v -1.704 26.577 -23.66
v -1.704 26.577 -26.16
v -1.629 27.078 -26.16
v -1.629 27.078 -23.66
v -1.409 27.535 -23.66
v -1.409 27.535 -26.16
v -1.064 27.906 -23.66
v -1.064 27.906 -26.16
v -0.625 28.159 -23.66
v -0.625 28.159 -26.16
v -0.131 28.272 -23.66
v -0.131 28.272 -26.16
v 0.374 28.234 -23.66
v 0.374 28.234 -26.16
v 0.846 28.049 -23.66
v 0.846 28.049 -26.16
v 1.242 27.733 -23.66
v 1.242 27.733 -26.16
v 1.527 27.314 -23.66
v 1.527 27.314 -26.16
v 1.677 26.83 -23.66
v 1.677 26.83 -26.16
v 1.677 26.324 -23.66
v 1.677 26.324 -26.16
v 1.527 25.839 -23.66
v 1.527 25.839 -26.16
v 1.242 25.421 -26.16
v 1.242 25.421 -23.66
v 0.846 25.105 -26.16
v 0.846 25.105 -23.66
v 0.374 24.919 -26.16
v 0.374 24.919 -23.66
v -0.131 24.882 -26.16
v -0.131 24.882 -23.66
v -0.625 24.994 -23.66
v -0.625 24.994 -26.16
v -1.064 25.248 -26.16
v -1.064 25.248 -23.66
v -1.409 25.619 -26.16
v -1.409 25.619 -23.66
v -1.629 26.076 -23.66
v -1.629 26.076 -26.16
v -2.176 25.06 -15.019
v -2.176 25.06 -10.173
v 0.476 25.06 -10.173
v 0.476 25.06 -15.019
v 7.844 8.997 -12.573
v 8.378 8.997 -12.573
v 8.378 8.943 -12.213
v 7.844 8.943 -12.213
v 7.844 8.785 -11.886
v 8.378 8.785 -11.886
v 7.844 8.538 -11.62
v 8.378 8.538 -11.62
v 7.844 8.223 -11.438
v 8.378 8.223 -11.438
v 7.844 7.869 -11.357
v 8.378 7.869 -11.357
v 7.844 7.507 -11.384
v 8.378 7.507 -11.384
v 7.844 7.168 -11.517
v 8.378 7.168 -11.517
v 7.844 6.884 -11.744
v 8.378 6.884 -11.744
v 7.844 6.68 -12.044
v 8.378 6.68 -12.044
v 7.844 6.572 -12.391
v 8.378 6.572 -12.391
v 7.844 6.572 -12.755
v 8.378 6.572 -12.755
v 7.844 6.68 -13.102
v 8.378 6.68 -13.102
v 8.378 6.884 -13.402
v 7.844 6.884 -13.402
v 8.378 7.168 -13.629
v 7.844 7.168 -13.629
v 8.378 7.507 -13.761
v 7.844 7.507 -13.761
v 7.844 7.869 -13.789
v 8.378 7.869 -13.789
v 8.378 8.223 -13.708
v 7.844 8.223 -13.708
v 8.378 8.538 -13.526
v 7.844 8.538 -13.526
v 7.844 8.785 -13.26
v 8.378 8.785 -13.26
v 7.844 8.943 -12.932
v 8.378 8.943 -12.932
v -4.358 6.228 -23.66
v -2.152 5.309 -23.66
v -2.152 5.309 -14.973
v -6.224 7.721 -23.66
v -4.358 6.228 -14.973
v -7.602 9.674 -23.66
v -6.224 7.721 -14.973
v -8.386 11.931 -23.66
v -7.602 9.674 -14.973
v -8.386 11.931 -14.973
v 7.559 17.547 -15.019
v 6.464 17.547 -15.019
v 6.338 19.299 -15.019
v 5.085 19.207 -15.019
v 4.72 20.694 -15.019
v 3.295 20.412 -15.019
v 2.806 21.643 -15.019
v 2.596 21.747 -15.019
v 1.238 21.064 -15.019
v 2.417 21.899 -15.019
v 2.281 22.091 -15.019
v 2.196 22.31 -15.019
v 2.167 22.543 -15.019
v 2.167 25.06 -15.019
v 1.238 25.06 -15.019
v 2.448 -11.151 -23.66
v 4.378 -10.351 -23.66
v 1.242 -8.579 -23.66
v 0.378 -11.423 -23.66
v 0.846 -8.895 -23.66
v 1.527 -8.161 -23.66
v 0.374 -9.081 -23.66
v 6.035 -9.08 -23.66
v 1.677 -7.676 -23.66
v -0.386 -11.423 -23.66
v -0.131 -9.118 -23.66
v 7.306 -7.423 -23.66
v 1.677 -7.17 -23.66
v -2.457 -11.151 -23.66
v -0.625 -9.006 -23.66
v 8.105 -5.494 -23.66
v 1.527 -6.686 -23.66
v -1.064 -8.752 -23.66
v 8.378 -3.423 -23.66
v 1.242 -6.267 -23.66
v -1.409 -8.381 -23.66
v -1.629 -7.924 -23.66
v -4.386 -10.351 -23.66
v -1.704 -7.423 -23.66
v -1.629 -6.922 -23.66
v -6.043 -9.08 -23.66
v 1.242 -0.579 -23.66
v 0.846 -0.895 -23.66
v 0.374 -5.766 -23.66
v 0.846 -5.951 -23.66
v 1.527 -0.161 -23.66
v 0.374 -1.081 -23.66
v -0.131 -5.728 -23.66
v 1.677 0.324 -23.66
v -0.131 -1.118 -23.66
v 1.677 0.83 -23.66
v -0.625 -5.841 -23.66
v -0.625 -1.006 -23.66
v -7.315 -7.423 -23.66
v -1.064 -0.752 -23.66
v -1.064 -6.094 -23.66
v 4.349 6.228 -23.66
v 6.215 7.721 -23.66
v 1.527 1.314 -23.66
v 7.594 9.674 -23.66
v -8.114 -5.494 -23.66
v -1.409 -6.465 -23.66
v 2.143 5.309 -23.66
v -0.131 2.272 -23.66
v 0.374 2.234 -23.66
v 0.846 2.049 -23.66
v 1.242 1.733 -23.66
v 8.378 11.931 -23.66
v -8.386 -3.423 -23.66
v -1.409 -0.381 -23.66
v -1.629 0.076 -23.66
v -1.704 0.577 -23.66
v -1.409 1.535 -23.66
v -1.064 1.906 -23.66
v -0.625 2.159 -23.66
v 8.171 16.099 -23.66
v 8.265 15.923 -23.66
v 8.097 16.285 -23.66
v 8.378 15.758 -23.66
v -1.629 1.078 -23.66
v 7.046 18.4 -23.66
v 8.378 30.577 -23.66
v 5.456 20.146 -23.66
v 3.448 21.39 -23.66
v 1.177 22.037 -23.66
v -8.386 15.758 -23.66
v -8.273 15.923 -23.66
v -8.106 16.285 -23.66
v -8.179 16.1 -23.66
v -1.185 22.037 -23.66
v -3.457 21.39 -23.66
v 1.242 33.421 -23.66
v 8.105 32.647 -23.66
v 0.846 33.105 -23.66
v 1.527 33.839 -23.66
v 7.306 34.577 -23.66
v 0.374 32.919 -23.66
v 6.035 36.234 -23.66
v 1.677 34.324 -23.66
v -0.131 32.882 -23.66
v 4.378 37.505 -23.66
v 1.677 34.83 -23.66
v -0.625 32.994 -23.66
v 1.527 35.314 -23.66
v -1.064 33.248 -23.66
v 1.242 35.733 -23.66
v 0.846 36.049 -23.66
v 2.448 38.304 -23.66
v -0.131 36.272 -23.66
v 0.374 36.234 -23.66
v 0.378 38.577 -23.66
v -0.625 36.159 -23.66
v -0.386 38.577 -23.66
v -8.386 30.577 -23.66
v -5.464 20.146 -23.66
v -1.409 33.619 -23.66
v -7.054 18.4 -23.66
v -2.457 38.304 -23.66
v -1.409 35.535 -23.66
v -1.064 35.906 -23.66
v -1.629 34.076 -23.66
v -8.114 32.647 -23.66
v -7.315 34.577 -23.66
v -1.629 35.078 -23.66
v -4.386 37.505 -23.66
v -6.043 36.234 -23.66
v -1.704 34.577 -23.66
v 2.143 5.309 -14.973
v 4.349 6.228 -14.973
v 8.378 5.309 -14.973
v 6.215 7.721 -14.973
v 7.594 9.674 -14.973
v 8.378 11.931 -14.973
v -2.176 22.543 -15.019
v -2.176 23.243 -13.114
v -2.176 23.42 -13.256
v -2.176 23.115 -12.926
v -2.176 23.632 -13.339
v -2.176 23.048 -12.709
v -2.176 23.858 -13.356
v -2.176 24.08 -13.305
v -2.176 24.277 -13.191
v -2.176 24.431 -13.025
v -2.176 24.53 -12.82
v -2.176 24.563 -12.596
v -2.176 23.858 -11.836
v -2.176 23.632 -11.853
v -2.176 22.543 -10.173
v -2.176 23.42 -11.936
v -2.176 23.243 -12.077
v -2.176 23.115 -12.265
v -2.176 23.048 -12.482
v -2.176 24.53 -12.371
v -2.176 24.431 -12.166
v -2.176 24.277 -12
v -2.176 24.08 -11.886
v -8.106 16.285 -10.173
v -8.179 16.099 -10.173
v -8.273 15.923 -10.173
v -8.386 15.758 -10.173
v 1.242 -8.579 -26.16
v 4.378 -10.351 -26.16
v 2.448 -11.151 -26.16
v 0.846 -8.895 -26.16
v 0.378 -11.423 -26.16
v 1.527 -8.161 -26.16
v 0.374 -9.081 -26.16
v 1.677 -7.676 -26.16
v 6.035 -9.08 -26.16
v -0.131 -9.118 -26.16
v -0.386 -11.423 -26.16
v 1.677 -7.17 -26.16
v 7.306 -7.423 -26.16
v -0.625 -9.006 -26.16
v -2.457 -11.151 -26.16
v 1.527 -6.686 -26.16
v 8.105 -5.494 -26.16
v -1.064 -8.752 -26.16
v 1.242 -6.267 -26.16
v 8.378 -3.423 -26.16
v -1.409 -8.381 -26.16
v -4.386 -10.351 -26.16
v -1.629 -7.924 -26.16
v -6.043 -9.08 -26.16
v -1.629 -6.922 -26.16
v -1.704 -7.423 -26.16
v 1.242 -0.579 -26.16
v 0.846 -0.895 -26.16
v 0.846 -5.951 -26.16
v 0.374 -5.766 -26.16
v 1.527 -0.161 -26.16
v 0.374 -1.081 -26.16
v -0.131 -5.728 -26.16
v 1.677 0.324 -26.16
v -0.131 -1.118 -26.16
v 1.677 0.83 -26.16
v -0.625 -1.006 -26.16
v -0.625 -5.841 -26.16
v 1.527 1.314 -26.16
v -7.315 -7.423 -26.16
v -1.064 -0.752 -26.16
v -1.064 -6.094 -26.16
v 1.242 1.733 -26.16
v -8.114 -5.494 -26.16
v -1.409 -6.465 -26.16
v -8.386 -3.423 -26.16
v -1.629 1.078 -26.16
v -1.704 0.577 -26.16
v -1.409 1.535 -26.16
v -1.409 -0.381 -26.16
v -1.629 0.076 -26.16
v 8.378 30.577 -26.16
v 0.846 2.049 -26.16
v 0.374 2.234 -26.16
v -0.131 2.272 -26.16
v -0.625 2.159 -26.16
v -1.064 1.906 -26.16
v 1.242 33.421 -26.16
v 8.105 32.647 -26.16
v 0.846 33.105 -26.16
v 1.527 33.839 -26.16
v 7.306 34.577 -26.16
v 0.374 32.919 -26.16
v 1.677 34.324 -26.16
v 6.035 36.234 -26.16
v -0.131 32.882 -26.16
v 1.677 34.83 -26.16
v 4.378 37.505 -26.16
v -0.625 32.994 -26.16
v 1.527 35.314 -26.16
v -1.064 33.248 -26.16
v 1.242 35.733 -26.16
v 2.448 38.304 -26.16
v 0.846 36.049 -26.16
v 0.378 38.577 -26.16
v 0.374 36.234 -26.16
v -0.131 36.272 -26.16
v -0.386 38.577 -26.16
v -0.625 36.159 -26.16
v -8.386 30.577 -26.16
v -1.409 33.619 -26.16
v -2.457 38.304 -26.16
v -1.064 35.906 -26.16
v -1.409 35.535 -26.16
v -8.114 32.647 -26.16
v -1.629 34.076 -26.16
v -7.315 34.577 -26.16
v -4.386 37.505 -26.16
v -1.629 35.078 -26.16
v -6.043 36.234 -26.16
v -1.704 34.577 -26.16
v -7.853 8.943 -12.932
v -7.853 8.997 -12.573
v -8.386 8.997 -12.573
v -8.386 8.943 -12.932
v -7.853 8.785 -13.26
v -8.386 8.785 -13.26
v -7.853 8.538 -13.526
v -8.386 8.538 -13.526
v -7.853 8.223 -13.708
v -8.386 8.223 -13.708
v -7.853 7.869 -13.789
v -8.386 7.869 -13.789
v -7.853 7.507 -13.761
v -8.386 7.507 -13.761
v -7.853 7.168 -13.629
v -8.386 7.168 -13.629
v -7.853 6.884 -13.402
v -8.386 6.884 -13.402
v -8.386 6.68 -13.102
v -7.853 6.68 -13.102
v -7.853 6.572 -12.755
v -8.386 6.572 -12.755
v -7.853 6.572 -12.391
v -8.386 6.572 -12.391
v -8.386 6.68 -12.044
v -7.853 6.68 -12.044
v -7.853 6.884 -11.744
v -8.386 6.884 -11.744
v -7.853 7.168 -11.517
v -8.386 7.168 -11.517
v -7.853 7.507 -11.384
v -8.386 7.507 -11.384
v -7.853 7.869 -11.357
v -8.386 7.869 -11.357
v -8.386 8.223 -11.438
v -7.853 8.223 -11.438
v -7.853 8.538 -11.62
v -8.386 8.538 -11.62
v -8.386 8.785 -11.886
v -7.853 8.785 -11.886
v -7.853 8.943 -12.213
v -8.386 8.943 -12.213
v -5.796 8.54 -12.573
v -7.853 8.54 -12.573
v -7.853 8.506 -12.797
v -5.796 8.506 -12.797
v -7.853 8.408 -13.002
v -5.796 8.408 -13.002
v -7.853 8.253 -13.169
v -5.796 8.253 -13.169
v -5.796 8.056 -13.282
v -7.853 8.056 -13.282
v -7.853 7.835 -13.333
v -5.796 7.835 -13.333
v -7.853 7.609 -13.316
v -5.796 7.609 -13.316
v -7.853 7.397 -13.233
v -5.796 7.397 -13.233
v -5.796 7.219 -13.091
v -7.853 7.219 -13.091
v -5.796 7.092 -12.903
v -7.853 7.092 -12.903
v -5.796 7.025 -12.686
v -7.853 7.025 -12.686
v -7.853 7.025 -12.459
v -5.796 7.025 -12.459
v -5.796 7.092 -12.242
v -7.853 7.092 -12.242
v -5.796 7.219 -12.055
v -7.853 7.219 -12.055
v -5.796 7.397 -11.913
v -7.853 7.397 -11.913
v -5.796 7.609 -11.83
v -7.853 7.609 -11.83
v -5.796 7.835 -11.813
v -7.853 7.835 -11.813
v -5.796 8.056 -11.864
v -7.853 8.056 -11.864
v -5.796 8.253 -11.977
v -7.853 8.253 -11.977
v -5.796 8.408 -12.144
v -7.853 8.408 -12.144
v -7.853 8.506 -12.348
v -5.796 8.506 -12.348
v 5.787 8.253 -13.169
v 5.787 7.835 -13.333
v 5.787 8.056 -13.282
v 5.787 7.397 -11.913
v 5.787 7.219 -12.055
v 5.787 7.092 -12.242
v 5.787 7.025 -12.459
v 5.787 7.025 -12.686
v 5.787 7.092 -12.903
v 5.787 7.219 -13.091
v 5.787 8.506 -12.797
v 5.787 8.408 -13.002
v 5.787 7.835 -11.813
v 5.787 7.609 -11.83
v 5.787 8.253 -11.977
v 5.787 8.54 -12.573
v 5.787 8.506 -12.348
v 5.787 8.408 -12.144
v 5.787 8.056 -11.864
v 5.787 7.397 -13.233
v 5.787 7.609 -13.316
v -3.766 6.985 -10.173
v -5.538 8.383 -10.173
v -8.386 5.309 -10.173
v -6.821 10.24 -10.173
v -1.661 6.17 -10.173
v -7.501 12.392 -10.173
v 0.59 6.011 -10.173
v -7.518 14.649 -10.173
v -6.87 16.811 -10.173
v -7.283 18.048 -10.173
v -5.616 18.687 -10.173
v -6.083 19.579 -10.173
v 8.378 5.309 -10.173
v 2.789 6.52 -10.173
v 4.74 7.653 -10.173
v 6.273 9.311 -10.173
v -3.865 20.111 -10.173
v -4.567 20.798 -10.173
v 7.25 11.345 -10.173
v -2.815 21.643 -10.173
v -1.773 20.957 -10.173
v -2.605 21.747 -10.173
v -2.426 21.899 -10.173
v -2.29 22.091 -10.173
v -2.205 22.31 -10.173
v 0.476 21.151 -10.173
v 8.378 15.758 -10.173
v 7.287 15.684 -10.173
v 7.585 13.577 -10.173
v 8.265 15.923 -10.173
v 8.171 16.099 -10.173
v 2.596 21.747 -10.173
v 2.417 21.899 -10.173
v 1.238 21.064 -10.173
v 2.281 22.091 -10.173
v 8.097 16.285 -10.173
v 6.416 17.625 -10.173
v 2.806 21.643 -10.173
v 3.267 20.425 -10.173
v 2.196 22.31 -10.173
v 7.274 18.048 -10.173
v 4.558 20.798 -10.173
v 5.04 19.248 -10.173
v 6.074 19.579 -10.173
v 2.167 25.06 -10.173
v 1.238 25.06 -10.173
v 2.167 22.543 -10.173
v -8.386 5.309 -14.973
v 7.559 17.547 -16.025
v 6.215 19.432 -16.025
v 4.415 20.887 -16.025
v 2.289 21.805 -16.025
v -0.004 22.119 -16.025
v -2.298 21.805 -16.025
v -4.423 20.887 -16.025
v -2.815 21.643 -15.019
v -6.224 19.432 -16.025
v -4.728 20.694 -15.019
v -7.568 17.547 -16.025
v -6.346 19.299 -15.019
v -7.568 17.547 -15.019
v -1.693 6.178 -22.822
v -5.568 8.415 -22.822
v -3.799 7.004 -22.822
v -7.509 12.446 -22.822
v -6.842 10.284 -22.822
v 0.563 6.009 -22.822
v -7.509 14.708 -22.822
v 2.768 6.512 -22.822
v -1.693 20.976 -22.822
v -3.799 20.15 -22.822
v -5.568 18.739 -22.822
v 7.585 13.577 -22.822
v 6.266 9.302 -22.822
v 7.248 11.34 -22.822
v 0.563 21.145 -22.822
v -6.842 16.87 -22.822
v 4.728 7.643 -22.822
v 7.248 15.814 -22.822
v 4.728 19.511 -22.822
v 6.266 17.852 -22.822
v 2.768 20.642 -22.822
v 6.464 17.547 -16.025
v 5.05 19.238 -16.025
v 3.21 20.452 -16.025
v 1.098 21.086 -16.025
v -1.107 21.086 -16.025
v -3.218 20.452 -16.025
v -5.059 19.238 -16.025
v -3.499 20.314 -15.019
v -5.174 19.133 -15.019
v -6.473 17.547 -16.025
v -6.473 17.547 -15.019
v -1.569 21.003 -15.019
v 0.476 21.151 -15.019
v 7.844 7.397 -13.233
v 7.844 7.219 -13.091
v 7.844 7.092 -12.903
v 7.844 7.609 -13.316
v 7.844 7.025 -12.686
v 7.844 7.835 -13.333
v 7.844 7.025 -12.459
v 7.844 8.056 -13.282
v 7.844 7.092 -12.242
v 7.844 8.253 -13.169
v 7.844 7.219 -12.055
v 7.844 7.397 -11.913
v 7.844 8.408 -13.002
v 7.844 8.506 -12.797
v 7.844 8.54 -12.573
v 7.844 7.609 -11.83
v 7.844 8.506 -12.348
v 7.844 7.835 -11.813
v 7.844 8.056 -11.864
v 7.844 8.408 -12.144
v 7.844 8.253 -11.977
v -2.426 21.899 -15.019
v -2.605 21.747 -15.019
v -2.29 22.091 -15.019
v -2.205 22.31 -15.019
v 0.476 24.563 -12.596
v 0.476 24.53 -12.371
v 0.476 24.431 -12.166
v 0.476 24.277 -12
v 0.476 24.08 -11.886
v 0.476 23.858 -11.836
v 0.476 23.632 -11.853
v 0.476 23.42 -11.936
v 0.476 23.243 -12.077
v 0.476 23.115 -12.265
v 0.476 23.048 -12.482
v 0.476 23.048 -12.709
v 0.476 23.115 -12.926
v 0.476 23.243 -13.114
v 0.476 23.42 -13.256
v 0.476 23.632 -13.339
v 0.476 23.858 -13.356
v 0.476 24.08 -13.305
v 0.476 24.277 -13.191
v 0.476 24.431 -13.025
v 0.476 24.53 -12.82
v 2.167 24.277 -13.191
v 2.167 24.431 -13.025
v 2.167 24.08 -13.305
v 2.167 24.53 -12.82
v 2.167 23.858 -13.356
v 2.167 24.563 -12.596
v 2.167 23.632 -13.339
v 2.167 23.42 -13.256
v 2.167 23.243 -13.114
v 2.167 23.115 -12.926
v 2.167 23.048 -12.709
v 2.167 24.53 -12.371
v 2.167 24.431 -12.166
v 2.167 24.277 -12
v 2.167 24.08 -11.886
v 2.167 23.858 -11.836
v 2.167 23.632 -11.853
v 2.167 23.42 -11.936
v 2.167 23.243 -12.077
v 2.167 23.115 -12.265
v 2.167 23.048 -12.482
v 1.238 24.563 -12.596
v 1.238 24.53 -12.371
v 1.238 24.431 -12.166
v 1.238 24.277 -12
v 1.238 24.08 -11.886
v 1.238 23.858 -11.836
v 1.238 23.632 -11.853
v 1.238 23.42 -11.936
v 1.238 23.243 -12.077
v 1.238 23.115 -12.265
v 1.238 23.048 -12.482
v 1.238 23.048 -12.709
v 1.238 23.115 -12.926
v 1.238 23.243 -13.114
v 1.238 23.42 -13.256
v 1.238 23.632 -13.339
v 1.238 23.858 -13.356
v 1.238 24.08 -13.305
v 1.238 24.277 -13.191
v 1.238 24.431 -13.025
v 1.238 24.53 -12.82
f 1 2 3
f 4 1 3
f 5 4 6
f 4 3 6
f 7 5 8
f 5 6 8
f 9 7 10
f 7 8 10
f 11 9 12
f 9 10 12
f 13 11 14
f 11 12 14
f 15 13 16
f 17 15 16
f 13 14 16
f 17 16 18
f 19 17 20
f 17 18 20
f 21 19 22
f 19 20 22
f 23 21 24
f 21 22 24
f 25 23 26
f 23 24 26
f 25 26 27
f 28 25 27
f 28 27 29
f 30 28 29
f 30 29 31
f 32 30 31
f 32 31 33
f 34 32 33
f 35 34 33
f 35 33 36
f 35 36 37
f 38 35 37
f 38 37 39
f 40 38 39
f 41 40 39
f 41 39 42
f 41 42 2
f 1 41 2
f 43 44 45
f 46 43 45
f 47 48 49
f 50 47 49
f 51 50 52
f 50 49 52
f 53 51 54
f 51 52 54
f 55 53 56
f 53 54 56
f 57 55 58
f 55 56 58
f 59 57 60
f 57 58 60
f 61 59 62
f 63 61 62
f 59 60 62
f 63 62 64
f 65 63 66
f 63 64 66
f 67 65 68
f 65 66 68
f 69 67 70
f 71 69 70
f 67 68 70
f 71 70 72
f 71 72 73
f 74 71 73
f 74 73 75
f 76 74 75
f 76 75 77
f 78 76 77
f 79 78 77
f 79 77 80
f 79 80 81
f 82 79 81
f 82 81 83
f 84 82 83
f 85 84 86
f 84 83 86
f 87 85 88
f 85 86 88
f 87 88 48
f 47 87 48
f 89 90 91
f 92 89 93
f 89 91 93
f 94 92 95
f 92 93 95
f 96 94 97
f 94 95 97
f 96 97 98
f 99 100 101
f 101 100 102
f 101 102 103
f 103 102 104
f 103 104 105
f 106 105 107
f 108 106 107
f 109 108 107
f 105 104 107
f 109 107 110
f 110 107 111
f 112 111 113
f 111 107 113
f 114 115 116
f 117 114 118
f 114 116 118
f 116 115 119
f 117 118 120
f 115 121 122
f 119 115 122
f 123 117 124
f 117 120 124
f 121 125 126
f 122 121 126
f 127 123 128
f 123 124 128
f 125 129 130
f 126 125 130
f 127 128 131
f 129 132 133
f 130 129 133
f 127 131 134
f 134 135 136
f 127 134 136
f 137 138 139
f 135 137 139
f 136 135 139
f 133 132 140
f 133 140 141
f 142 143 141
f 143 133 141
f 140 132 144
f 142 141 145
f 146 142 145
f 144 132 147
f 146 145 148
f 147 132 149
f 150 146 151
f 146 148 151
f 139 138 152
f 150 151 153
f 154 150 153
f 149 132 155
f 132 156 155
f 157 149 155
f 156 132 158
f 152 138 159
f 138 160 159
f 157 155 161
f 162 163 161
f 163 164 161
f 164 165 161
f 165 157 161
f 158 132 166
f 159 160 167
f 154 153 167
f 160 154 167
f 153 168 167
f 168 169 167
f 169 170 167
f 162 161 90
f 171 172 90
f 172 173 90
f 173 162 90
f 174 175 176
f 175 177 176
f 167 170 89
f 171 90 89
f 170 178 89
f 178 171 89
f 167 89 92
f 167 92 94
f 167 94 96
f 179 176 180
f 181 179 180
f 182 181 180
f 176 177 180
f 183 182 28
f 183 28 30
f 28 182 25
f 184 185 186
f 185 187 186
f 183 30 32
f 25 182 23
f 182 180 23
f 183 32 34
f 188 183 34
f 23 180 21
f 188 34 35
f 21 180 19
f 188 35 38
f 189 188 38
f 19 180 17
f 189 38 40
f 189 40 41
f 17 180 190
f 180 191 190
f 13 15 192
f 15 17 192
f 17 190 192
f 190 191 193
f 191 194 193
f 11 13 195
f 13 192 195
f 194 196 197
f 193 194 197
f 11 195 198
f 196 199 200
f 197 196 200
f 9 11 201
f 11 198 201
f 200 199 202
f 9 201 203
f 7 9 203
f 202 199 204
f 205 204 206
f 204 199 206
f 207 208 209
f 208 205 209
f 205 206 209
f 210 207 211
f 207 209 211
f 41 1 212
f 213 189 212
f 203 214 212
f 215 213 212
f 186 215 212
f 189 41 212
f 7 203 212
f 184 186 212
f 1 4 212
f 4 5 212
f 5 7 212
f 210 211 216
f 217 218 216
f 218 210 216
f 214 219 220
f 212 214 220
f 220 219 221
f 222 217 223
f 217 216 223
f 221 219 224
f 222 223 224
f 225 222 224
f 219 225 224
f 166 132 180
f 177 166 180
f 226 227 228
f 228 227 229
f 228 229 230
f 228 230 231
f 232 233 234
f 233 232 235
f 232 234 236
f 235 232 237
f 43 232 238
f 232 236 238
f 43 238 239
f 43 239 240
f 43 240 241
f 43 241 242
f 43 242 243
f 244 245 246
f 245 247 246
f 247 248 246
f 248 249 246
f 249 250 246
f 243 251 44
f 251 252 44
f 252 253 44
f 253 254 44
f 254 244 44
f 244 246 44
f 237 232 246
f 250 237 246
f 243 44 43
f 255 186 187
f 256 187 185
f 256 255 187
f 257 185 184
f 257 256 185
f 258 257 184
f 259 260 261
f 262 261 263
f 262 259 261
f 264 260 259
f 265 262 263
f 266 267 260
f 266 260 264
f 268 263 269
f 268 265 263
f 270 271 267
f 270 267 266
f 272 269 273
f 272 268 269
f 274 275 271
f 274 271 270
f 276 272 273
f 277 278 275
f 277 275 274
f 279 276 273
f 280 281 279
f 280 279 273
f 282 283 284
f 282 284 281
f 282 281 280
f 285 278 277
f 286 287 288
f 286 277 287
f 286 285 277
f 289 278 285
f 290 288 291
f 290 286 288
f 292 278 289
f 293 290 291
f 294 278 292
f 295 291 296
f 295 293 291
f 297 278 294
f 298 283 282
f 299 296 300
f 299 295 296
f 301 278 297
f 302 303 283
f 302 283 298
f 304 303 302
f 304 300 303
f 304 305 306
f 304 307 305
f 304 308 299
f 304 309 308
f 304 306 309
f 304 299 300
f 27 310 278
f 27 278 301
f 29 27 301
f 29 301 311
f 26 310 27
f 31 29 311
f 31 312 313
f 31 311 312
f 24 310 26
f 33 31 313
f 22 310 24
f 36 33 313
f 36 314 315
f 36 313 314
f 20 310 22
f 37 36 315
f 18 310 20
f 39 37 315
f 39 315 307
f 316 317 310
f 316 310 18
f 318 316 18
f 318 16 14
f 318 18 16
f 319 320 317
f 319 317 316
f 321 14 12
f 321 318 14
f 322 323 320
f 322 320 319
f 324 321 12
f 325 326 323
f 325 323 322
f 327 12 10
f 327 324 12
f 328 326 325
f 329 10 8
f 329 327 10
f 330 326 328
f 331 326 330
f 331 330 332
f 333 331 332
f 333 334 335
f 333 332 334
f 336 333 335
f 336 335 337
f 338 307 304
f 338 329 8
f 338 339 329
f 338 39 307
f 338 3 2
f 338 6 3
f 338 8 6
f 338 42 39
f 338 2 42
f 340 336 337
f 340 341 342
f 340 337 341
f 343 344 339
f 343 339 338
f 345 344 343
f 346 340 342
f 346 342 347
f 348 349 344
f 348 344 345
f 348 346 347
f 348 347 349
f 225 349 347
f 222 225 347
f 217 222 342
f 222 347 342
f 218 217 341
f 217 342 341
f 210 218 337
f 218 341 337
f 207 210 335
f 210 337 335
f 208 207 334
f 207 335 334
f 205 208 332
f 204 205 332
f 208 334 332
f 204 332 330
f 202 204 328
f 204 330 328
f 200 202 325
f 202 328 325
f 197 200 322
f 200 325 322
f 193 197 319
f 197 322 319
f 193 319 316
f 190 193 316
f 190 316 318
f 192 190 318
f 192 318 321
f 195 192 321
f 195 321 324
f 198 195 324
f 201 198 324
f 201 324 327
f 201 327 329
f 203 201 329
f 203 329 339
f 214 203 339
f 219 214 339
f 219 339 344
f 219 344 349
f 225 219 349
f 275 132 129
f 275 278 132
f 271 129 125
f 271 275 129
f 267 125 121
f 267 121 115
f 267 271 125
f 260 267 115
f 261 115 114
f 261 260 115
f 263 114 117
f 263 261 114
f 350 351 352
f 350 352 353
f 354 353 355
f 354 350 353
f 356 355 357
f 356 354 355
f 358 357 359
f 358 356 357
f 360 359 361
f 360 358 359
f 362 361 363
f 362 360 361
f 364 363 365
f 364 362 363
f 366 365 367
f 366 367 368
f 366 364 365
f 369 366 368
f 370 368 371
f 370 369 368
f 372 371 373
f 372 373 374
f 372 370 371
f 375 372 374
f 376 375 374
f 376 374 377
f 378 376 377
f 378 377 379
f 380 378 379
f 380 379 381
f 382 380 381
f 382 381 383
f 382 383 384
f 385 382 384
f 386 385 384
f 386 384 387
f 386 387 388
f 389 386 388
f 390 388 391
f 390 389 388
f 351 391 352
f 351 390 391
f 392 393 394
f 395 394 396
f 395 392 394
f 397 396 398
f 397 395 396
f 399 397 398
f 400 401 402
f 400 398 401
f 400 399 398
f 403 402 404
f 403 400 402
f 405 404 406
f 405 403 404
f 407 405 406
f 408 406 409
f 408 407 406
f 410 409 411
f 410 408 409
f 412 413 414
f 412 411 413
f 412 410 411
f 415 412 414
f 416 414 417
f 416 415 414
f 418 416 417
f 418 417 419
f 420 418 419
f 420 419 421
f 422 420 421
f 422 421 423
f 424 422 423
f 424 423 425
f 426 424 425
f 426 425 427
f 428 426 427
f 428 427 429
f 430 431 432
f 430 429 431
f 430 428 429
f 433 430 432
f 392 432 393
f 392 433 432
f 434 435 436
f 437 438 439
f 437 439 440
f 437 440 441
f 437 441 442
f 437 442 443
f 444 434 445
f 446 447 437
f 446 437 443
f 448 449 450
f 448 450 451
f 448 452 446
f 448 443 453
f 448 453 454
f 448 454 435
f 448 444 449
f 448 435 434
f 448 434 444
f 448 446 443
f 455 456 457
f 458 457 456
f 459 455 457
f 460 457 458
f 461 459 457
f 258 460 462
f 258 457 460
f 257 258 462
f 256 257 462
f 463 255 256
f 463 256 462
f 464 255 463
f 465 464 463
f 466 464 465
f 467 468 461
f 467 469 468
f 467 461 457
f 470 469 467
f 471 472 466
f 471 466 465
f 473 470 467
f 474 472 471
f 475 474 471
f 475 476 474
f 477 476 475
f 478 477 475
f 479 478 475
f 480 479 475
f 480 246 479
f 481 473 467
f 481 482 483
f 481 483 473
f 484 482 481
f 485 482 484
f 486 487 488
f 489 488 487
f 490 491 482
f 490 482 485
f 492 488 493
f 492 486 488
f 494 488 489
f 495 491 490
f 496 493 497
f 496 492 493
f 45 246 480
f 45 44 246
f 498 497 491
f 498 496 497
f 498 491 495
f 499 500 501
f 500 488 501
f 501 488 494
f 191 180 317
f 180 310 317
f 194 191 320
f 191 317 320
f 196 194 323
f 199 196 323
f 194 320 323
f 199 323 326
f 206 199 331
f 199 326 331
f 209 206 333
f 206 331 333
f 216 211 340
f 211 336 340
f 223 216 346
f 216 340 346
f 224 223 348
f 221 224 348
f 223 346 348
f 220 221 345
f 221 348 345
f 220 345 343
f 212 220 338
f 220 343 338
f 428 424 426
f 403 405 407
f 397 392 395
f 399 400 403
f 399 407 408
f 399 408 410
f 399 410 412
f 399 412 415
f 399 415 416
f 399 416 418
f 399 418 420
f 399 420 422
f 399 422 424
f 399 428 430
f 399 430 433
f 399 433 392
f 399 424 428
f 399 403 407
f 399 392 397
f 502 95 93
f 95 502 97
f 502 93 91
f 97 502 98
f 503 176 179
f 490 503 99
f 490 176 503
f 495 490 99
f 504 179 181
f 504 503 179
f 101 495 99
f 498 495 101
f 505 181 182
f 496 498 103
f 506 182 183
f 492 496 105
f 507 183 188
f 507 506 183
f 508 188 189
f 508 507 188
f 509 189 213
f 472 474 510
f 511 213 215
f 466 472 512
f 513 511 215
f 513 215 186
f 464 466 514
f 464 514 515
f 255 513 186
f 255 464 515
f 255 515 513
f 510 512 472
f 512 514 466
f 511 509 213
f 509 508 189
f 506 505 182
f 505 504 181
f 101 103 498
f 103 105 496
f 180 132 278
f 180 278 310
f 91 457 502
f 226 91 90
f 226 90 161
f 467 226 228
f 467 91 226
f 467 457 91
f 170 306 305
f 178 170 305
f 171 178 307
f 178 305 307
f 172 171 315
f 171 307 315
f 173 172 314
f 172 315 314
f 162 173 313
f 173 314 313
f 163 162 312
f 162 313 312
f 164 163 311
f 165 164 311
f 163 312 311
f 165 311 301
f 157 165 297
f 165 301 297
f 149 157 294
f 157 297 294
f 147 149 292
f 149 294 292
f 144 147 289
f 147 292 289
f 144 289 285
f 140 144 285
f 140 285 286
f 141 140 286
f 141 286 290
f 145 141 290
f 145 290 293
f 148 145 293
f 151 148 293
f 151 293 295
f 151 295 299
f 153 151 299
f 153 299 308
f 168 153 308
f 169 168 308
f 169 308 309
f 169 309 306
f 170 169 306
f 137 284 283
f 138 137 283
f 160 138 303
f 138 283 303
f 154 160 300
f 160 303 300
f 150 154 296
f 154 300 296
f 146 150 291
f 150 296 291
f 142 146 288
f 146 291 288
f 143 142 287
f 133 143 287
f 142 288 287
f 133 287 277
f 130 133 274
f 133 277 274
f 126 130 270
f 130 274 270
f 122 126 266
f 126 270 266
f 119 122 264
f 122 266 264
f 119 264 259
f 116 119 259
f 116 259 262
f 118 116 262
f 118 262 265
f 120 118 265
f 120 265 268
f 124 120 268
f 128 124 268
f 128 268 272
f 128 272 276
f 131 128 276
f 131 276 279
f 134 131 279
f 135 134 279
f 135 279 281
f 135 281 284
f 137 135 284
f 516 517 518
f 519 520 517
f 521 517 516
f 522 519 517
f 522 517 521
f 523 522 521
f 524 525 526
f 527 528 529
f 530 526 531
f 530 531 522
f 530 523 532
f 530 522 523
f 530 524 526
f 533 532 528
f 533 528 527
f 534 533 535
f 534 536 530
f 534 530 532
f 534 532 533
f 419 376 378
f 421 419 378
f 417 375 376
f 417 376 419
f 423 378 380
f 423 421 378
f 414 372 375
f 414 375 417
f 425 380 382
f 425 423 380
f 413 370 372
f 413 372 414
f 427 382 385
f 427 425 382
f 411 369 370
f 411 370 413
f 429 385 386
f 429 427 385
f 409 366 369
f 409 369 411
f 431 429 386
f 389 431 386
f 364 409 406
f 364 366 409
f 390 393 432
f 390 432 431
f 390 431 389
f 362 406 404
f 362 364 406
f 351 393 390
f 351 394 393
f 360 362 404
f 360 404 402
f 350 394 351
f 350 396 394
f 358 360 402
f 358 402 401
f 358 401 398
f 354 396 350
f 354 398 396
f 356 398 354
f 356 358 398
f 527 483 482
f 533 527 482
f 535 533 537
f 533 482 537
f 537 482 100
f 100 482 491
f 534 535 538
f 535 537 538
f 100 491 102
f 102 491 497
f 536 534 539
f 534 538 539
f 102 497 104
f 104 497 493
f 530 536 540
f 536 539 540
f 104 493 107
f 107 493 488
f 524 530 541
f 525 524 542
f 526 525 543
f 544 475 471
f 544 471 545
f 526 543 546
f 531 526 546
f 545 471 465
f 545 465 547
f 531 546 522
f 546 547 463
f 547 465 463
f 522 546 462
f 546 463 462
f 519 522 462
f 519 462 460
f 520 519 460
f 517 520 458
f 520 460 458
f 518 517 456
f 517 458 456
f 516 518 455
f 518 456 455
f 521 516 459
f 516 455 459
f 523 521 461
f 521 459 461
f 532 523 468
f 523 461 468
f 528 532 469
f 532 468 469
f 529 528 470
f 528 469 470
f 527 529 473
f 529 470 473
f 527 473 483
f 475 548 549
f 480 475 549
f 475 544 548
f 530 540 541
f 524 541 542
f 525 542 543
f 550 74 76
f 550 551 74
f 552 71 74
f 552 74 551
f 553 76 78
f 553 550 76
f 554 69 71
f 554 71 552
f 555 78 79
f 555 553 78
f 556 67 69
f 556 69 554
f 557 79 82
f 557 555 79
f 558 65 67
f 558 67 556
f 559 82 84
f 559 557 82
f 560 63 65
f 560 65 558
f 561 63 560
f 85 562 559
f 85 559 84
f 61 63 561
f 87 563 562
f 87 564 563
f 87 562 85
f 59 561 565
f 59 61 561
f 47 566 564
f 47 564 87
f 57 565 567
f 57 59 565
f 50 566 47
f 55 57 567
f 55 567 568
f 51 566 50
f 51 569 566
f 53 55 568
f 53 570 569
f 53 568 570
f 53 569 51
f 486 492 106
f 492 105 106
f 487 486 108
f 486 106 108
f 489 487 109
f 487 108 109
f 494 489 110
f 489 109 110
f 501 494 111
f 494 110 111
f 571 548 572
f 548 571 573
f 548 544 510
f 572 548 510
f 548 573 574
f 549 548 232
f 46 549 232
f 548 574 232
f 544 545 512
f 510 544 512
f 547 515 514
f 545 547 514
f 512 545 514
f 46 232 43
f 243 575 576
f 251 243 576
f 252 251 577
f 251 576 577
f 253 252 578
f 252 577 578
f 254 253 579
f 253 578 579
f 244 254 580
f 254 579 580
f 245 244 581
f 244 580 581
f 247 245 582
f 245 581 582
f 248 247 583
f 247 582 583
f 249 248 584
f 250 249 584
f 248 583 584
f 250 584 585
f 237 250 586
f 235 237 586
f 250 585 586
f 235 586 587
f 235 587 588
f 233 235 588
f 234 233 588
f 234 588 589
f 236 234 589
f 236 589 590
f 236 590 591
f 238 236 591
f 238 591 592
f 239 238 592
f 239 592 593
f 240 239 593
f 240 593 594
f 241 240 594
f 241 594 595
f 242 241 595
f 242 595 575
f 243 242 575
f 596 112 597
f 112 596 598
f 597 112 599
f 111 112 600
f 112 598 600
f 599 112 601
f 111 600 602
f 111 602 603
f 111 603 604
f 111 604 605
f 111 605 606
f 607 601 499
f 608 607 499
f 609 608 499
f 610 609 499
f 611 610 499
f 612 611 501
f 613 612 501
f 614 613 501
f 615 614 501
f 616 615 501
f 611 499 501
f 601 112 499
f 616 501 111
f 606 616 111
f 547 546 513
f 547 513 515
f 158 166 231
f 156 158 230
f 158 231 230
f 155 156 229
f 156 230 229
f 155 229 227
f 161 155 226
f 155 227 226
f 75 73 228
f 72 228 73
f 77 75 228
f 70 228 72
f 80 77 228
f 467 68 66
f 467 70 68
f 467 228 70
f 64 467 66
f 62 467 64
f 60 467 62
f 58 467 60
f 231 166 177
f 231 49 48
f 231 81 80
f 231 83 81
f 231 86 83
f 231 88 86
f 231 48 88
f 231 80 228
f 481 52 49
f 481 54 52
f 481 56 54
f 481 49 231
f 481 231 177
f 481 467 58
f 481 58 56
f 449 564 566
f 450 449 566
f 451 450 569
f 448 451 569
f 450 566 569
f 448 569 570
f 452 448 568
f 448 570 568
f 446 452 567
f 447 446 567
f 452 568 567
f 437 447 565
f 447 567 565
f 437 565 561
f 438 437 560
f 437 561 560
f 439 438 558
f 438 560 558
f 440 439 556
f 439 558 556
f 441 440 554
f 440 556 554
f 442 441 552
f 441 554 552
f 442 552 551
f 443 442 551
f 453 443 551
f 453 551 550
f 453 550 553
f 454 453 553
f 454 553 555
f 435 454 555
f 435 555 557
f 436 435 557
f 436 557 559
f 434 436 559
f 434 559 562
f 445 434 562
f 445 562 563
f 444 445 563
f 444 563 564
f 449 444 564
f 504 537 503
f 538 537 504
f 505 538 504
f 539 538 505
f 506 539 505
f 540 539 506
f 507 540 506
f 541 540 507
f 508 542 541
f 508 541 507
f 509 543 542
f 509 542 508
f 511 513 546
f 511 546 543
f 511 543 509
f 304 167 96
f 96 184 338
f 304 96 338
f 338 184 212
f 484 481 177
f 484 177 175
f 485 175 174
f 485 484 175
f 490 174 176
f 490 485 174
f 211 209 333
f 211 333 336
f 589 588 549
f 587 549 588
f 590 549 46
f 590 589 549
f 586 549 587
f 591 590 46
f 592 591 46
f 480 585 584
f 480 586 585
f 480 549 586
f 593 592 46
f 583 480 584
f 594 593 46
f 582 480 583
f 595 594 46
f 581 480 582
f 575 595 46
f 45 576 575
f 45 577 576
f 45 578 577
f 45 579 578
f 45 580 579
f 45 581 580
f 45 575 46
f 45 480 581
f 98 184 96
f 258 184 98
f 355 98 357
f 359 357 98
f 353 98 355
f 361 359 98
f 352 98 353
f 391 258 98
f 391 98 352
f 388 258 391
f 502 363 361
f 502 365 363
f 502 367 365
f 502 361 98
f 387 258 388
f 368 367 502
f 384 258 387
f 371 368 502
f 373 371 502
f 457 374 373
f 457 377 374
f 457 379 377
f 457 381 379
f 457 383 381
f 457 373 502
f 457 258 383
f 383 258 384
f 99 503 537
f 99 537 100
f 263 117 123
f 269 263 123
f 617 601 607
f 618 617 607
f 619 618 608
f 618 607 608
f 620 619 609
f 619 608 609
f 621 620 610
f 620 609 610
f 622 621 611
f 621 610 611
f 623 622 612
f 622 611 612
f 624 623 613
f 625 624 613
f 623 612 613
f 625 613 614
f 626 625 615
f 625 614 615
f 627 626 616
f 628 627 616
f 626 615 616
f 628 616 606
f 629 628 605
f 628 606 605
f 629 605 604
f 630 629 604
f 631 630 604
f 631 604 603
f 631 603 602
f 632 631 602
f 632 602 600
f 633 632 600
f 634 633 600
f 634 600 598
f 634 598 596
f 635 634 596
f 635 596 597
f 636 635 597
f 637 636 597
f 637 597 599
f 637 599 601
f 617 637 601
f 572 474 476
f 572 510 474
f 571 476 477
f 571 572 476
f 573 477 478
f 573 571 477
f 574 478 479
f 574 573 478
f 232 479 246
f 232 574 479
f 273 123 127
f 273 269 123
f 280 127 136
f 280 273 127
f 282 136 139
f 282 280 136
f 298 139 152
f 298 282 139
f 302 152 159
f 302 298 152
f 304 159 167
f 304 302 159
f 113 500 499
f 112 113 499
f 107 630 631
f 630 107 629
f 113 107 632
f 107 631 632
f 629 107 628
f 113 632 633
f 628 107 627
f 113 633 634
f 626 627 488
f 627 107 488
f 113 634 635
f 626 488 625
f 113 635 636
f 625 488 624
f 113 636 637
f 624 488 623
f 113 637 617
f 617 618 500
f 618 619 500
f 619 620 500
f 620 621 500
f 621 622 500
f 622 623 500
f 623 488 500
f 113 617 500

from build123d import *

# Parameters (mm, degrees)
BOSS_EXTRUDE1_DEPTH      = 55.499
SKETCH2_R                = 12.6492
CUT_EXTRUDE1_DEPTH       = 21.082
CUT_EXTRUDE2_START       = -47.498
CUT_EXTRUDE2_DEPTH       = 47.498
CUT_EXTRUDE3_DEPTH       = 64.719756461
CUT_EXTRUDE4_DEPTH       = 69.159299334
CUT_EXTRUDE5_DEPTH       = 69.159299334
FILLET1_R                = 4.9911
FILLET2_R                = 4.9911
SKETCH7_R                = 1.27
CUT_EXTRUDE6_DEPTH       = 4.826
CUT_EXTRUDE7_START       = -4.826
SKETCH8_R                = 1.27
CUT_EXTRUDE7_DEPTH       = 4.826
SKETCH9_R                = 1.27
CUT_EXTRUDE8_DEPTH       = 4.318
CUT_EXTRUDE9_START       = -4.318
SKETCH10_R               = 1.27
CUT_EXTRUDE9_DEPTH       = 4.318
SKETCH11_W               = 1.6764
SKETCH11_H               = 7.62
CUT_EXTRUDE10_DEPTH      = 69.159299334
BOSS_EXTRUDE2_DEPTH      = 8.0772
SKETCH13_W               = 1.27
SKETCH13_H               = 8.69888745
CUT_EXTRUDE11_DEPTH      = 8.0772
FILLET3_R                = 1.5875
SKETCH14_R               = 1.27
CUT_EXTRUDE12_DEPTH      = 67.881616192
SKETCH15_R               = 2.032
CUT_EXTRUDE13_DEPTH      = 0.889
CUT_EXTRUDE14_START      = -0.889
SKETCH16_R               = 2.032
CUT_EXTRUDE14_DEPTH      = 0.889
SCALE1_SCALE             = 0.6
CUT_EXTRUDE15_DEPTH      = 51.873928307
CUT_EXTRUDE15_DEPTH_BACK = 51.873928307
SKETCH17_W               = 22.594181605
SKETCH17_H               = 22.052877317
SKETCH18_W               = 16.764
SKETCH18_H               = 50
BOSS_EXTRUDE3_DEPTH      = 2.5
FILLET4_R                = 8
M3_CLEARANCE_HOLE1_D     = 3.4
M3_CLEARANCE_HOLE1_DEPTH = 2.5


with BuildPart() as part:
    # Sketch1 → Boss-Extrude1 (new body)
    with BuildSketch(Plane.XY):
        with BuildLine():
            Line((-13.97, 0), (13.97, 0))
            Line((13.97, 0), (13.97, 17.415057792))
            ThreePointArc((13.97, 17.415057792), (13.699370909, 17.834675567), (13.502160632, 18.293399109))
            ThreePointArc((13.502160632, 18.293399109), (0, 28.0162), (-13.502160632, 18.293399109))
            ThreePointArc((-13.502160632, 18.293399109), (-13.699370909, 17.834675567), (-13.97, 17.415057792))
            Line((-13.97, 17.415057792), (-13.97, 0))
        make_face()
    extrude(amount=-BOSS_EXTRUDE1_DEPTH)

    # Sketch2 → Cut-Extrude1 (cut)
    with BuildSketch(Plane.XY):
        with Locations((0, 13.7795)):
            Circle(SKETCH2_R)
    extrude(amount=-CUT_EXTRUDE1_DEPTH, mode=Mode.SUBTRACT)

    # Sketch3 → Cut-Extrude2 (cut)
    with BuildSketch(Plane(origin=(0, 0, -55.499), x_dir=(-1, 0, 0), z_dir=(0, 0, -1)).offset(CUT_EXTRUDE2_START)):
        with BuildLine():
            Line((-13.97, 0), (-13.97, 11.036741008))
            ThreePointArc((-13.97, 11.036741008), (-10.365518606, 4.020419566), (-3.578967259, 0))
            Line((-3.578967259, 0), (-13.97, 0))
        make_face()
        with BuildLine():
            Line((13.97, 0), (3.578967259, 0))
            ThreePointArc((3.578967259, 0), (10.365518606, 4.020419566), (13.97, 11.036741008))
            Line((13.97, 11.036741008), (13.97, 0))
        make_face()
    extrude(amount=CUT_EXTRUDE2_DEPTH, mode=Mode.SUBTRACT)

    # Sketch4 → Cut-Extrude3 (cut, through all)
    with BuildSketch(Plane(origin=(0, 0, 0), x_dir=(1, 0, 0), z_dir=(0, 1, 0))):
        with BuildLine():
            Line((-10.033, 46.5201), (-10.033, 26.4795))
            ThreePointArc((-10.033, 26.4795), (-8.861280678, 23.650719322), (-6.0325, 22.479))
            Line((-6.0325, 22.479), (6.0325, 22.479))
            ThreePointArc((6.0325, 22.479), (8.861280678, 23.650719322), (10.033, 26.4795))
            Line((10.033, 26.4795), (10.033, 46.5201))
            ThreePointArc((10.033, 46.5201), (8.861280678, 49.348880678), (6.0325, 50.5206))
            Line((6.0325, 50.5206), (-6.0325, 50.5206))
            ThreePointArc((-6.0325, 50.5206), (-8.861280678, 49.348880678), (-10.033, 46.5201))
        make_face()
    extrude(amount=CUT_EXTRUDE3_DEPTH, mode=Mode.SUBTRACT)

    # Sketch5 → Cut-Extrude4 (cut, through all)
    with BuildSketch(Plane(origin=(13.97, 0, 0), x_dir=(0, 0, -1), z_dir=(1, 0, 0))):
        with BuildLine():
            Line((22.479, 30.552887158), (22.479, 23.126200001))
            ThreePointArc((22.479, 23.126200001), (23.650572876, 20.297772876), (26.479000001, 19.1262))
            Line((26.479000001, 19.1262), (58.380075255, 19.1262))
            Line((58.380075255, 19.1262), (58.380075255, 30.552887158))
            Line((58.380075255, 30.552887158), (22.479, 30.552887158))
        make_face()
    extrude(amount=-CUT_EXTRUDE4_DEPTH, mode=Mode.SUBTRACT)

    # Sketch6 → Cut-Extrude5 (cut, through all)
    with BuildSketch(Plane(origin=(13.97, 0, 0), x_dir=(0, 0, -1), z_dir=(1, 0, 0))):
        with BuildLine():
            Line((26.479000001, 5.7404), (41.275, 5.7404))
            Line((41.275, 5.7404), (56.850797395, 10.801283358))
            Line((56.850797395, 10.801283358), (56.850797395, -1.681383137))
            Line((56.850797395, -1.681383137), (22.479, -1.681383137))
            Line((22.479, -1.681383137), (22.479, 1.740399999))
            ThreePointArc((22.479, 1.740399999), (23.650572876, 4.568827124), (26.479000001, 5.7404))
        make_face()
    extrude(amount=-CUT_EXTRUDE5_DEPTH, mode=Mode.SUBTRACT)

    # Fillet1
    fillet1_edges = [part.edges().sort_by_distance(p)[0] for p in [
        (0, 19.1262, -55.499),
    ]]
    fillet(fillet1_edges, radius=FILLET1_R)

    # Fillet2
    fillet2_edges = [part.edges().sort_by_distance(p)[0] for p in [
        (0, 10.362057759, -55.499),
    ]]
    fillet(fillet2_edges, radius=FILLET2_R)

    # Sketch7 → Cut-Extrude6 (cut)
    with BuildSketch(Plane(origin=(13.97, 0, 0), x_dir=(0, 0, -1), z_dir=(1, 0, 0))):
        with Locations(Location((50.5079, 14.061702085, 0), (0, 0, 90))):
            Circle(SKETCH7_R)
    extrude(amount=-CUT_EXTRUDE6_DEPTH, mode=Mode.SUBTRACT)

    # Sketch8 → Cut-Extrude7 (cut)
    with BuildSketch(Plane.ZY.offset(13.97).offset(CUT_EXTRUDE7_START)):
        with Locations(Location((-50.5079, 14.061702085, 0), (0, 0, 90))):
            Circle(SKETCH8_R)
    extrude(amount=CUT_EXTRUDE7_DEPTH, mode=Mode.SUBTRACT)

    # Sketch9 → Cut-Extrude8 (cut)
    with BuildSketch(Plane(origin=(13.97, 0, 0), x_dir=(0, 0, -1), z_dir=(1, 0, 0))):
        with Locations(Location((4.0005, 4.1148, 0), (0, 0, 90))):
            Circle(SKETCH9_R)
    extrude(amount=-CUT_EXTRUDE8_DEPTH, mode=Mode.SUBTRACT)

    # Sketch10 → Cut-Extrude9 (cut)
    with BuildSketch(Plane.ZY.offset(13.97).offset(CUT_EXTRUDE9_START)):
        with Locations(Location((-4.0005, 4.1148, 0), (0, 0, 90))):
            Circle(SKETCH10_R)
    extrude(amount=CUT_EXTRUDE9_DEPTH, mode=Mode.SUBTRACT)

    # Sketch11 → Cut-Extrude10 (cut, through all)
    with BuildSketch(Plane.ZY.offset(13.97)):
        with Locations((-8.9154, 24.2062)):
            Rectangle(SKETCH11_W, SKETCH11_H)
    extrude(amount=-CUT_EXTRUDE10_DEPTH, mode=Mode.SUBTRACT)

    # Sketch12 → Boss-Extrude2 (add)
    with BuildSketch(Plane.XY):
        with BuildLine():
            Line((-3.6195, 32.9184), (3.6195, 32.9184))
            Line((3.6195, 32.9184), (3.6195, 27.548408695))
            ThreePointArc((3.6195, 27.548408695), (0, 28.0162), (-3.6195, 27.548408695))
            Line((-3.6195, 27.548408695), (-3.6195, 32.9184))
        make_face()
    extrude(amount=-BOSS_EXTRUDE2_DEPTH)

    # Sketch13 → Cut-Extrude11 (cut)
    with BuildSketch(Plane.XY):
        with Locations((1.4351, 29.199787514)):
            Rectangle(SKETCH13_W, SKETCH13_H)
    extrude(amount=-CUT_EXTRUDE11_DEPTH, mode=Mode.SUBTRACT)

    # Fillet3
    fillet3_edges = [part.edges().sort_by_distance(p)[0] for p in [
        (3.6195, 27.548408695, -4.0386),
        (-3.6195, 27.548408695, -4.0386),
    ]]
    fillet(fillet3_edges, radius=FILLET3_R)

    # Sketch14 → Cut-Extrude12 (cut, through all)
    with BuildSketch(Plane(origin=(3.6195, 0, 0), x_dir=(0, 0, -1), z_dir=(1, 0, 0))):
        with Locations(Location((4.0386, 30.820436744, 0), (0, 0, 90))):
            Circle(SKETCH14_R)
    extrude(amount=-CUT_EXTRUDE12_DEPTH, mode=Mode.SUBTRACT)

    # Sketch15 → Cut-Extrude13 (cut)
    with BuildSketch(Plane(origin=(13.97, 0, 0), x_dir=(0, 0, -1), z_dir=(1, 0, 0))):
        with Locations(Location((4.0005, 4.1148, 0), (0, 0, 90))):
            Circle(SKETCH15_R)
        with Locations(Location((50.5079, 14.061702085, 0), (0, 0, 90))):
            Circle(SKETCH15_R)
    extrude(amount=-CUT_EXTRUDE13_DEPTH, mode=Mode.SUBTRACT)

    # Sketch16 → Cut-Extrude14 (cut)
    with BuildSketch(Plane.ZY.offset(13.97).offset(CUT_EXTRUDE14_START)):
        with Locations(Location((-50.5079, 14.061702085, 0), (0, 0, 90))):
            Circle(SKETCH16_R)
        with Locations(Location((-4.0005, 4.1148, 0), (0, 0, 90))):
            Circle(SKETCH16_R)
    extrude(amount=CUT_EXTRUDE14_DEPTH, mode=Mode.SUBTRACT)


with BuildPart() as part_1:
    # Scale1: scaled about (-0.010832485, 13.272964488, -25.431393294)
    add(part.part.scale(SCALE1_SCALE).moved(Location((-0.004332994, 5.309185795, -10.172557318))))

    # Sketch17 → Cut-Extrude15 (cut, two sides: drawn at the far end of the back side and taken through both)
    with BuildSketch(Plane(origin=(0, 0, 0), x_dir=(1, 0, 0), z_dir=(0, 1, 0)).offset(-CUT_EXTRUDE15_DEPTH_BACK)):
        with Locations((1.099382363, 34.686357372)):
            Rectangle(SKETCH17_W, SKETCH17_H)
    extrude(amount=CUT_EXTRUDE15_DEPTH + CUT_EXTRUDE15_DEPTH_BACK, mode=Mode.SUBTRACT)

    # Sketch18 → Boss-Extrude3 (add)
    with BuildSketch(Plane(origin=(0, 0, -23.659918713), x_dir=(-1, 0, 0), z_dir=(0, 0, -1))):
        with Locations((0.004315992, 13.576876814)):
            Rectangle(SKETCH18_W, SKETCH18_H)
    extrude(amount=BOSS_EXTRUDE3_DEPTH)

    # Fillet4
    fillet4_edges = [part_1.edges().sort_by_distance(p)[0] for p in [
        (8.377684008, 38.576876814, -24.909918713),
        (8.377684008, -11.423123186, -24.909918713),
        (-8.386315992, -11.423123186, -24.909918713),
        (-8.386315992, 38.576876814, -24.909918713),
    ]]
    fillet(fillet4_edges, radius=FILLET4_R)

    # M3 Clearance Hole1
    with Locations(Plane.XY.offset(-23.659918713)):
        with Locations((-0.004315992, 26.576876814), (-0.004315992, -7.423123186), (-0.004315992, 0.576876814), (-0.004315992, 34.576876814)):
            Hole(M3_CLEARANCE_HOLE1_D / 2, depth=M3_CLEARANCE_HOLE1_DEPTH)


solid = part_1.part
